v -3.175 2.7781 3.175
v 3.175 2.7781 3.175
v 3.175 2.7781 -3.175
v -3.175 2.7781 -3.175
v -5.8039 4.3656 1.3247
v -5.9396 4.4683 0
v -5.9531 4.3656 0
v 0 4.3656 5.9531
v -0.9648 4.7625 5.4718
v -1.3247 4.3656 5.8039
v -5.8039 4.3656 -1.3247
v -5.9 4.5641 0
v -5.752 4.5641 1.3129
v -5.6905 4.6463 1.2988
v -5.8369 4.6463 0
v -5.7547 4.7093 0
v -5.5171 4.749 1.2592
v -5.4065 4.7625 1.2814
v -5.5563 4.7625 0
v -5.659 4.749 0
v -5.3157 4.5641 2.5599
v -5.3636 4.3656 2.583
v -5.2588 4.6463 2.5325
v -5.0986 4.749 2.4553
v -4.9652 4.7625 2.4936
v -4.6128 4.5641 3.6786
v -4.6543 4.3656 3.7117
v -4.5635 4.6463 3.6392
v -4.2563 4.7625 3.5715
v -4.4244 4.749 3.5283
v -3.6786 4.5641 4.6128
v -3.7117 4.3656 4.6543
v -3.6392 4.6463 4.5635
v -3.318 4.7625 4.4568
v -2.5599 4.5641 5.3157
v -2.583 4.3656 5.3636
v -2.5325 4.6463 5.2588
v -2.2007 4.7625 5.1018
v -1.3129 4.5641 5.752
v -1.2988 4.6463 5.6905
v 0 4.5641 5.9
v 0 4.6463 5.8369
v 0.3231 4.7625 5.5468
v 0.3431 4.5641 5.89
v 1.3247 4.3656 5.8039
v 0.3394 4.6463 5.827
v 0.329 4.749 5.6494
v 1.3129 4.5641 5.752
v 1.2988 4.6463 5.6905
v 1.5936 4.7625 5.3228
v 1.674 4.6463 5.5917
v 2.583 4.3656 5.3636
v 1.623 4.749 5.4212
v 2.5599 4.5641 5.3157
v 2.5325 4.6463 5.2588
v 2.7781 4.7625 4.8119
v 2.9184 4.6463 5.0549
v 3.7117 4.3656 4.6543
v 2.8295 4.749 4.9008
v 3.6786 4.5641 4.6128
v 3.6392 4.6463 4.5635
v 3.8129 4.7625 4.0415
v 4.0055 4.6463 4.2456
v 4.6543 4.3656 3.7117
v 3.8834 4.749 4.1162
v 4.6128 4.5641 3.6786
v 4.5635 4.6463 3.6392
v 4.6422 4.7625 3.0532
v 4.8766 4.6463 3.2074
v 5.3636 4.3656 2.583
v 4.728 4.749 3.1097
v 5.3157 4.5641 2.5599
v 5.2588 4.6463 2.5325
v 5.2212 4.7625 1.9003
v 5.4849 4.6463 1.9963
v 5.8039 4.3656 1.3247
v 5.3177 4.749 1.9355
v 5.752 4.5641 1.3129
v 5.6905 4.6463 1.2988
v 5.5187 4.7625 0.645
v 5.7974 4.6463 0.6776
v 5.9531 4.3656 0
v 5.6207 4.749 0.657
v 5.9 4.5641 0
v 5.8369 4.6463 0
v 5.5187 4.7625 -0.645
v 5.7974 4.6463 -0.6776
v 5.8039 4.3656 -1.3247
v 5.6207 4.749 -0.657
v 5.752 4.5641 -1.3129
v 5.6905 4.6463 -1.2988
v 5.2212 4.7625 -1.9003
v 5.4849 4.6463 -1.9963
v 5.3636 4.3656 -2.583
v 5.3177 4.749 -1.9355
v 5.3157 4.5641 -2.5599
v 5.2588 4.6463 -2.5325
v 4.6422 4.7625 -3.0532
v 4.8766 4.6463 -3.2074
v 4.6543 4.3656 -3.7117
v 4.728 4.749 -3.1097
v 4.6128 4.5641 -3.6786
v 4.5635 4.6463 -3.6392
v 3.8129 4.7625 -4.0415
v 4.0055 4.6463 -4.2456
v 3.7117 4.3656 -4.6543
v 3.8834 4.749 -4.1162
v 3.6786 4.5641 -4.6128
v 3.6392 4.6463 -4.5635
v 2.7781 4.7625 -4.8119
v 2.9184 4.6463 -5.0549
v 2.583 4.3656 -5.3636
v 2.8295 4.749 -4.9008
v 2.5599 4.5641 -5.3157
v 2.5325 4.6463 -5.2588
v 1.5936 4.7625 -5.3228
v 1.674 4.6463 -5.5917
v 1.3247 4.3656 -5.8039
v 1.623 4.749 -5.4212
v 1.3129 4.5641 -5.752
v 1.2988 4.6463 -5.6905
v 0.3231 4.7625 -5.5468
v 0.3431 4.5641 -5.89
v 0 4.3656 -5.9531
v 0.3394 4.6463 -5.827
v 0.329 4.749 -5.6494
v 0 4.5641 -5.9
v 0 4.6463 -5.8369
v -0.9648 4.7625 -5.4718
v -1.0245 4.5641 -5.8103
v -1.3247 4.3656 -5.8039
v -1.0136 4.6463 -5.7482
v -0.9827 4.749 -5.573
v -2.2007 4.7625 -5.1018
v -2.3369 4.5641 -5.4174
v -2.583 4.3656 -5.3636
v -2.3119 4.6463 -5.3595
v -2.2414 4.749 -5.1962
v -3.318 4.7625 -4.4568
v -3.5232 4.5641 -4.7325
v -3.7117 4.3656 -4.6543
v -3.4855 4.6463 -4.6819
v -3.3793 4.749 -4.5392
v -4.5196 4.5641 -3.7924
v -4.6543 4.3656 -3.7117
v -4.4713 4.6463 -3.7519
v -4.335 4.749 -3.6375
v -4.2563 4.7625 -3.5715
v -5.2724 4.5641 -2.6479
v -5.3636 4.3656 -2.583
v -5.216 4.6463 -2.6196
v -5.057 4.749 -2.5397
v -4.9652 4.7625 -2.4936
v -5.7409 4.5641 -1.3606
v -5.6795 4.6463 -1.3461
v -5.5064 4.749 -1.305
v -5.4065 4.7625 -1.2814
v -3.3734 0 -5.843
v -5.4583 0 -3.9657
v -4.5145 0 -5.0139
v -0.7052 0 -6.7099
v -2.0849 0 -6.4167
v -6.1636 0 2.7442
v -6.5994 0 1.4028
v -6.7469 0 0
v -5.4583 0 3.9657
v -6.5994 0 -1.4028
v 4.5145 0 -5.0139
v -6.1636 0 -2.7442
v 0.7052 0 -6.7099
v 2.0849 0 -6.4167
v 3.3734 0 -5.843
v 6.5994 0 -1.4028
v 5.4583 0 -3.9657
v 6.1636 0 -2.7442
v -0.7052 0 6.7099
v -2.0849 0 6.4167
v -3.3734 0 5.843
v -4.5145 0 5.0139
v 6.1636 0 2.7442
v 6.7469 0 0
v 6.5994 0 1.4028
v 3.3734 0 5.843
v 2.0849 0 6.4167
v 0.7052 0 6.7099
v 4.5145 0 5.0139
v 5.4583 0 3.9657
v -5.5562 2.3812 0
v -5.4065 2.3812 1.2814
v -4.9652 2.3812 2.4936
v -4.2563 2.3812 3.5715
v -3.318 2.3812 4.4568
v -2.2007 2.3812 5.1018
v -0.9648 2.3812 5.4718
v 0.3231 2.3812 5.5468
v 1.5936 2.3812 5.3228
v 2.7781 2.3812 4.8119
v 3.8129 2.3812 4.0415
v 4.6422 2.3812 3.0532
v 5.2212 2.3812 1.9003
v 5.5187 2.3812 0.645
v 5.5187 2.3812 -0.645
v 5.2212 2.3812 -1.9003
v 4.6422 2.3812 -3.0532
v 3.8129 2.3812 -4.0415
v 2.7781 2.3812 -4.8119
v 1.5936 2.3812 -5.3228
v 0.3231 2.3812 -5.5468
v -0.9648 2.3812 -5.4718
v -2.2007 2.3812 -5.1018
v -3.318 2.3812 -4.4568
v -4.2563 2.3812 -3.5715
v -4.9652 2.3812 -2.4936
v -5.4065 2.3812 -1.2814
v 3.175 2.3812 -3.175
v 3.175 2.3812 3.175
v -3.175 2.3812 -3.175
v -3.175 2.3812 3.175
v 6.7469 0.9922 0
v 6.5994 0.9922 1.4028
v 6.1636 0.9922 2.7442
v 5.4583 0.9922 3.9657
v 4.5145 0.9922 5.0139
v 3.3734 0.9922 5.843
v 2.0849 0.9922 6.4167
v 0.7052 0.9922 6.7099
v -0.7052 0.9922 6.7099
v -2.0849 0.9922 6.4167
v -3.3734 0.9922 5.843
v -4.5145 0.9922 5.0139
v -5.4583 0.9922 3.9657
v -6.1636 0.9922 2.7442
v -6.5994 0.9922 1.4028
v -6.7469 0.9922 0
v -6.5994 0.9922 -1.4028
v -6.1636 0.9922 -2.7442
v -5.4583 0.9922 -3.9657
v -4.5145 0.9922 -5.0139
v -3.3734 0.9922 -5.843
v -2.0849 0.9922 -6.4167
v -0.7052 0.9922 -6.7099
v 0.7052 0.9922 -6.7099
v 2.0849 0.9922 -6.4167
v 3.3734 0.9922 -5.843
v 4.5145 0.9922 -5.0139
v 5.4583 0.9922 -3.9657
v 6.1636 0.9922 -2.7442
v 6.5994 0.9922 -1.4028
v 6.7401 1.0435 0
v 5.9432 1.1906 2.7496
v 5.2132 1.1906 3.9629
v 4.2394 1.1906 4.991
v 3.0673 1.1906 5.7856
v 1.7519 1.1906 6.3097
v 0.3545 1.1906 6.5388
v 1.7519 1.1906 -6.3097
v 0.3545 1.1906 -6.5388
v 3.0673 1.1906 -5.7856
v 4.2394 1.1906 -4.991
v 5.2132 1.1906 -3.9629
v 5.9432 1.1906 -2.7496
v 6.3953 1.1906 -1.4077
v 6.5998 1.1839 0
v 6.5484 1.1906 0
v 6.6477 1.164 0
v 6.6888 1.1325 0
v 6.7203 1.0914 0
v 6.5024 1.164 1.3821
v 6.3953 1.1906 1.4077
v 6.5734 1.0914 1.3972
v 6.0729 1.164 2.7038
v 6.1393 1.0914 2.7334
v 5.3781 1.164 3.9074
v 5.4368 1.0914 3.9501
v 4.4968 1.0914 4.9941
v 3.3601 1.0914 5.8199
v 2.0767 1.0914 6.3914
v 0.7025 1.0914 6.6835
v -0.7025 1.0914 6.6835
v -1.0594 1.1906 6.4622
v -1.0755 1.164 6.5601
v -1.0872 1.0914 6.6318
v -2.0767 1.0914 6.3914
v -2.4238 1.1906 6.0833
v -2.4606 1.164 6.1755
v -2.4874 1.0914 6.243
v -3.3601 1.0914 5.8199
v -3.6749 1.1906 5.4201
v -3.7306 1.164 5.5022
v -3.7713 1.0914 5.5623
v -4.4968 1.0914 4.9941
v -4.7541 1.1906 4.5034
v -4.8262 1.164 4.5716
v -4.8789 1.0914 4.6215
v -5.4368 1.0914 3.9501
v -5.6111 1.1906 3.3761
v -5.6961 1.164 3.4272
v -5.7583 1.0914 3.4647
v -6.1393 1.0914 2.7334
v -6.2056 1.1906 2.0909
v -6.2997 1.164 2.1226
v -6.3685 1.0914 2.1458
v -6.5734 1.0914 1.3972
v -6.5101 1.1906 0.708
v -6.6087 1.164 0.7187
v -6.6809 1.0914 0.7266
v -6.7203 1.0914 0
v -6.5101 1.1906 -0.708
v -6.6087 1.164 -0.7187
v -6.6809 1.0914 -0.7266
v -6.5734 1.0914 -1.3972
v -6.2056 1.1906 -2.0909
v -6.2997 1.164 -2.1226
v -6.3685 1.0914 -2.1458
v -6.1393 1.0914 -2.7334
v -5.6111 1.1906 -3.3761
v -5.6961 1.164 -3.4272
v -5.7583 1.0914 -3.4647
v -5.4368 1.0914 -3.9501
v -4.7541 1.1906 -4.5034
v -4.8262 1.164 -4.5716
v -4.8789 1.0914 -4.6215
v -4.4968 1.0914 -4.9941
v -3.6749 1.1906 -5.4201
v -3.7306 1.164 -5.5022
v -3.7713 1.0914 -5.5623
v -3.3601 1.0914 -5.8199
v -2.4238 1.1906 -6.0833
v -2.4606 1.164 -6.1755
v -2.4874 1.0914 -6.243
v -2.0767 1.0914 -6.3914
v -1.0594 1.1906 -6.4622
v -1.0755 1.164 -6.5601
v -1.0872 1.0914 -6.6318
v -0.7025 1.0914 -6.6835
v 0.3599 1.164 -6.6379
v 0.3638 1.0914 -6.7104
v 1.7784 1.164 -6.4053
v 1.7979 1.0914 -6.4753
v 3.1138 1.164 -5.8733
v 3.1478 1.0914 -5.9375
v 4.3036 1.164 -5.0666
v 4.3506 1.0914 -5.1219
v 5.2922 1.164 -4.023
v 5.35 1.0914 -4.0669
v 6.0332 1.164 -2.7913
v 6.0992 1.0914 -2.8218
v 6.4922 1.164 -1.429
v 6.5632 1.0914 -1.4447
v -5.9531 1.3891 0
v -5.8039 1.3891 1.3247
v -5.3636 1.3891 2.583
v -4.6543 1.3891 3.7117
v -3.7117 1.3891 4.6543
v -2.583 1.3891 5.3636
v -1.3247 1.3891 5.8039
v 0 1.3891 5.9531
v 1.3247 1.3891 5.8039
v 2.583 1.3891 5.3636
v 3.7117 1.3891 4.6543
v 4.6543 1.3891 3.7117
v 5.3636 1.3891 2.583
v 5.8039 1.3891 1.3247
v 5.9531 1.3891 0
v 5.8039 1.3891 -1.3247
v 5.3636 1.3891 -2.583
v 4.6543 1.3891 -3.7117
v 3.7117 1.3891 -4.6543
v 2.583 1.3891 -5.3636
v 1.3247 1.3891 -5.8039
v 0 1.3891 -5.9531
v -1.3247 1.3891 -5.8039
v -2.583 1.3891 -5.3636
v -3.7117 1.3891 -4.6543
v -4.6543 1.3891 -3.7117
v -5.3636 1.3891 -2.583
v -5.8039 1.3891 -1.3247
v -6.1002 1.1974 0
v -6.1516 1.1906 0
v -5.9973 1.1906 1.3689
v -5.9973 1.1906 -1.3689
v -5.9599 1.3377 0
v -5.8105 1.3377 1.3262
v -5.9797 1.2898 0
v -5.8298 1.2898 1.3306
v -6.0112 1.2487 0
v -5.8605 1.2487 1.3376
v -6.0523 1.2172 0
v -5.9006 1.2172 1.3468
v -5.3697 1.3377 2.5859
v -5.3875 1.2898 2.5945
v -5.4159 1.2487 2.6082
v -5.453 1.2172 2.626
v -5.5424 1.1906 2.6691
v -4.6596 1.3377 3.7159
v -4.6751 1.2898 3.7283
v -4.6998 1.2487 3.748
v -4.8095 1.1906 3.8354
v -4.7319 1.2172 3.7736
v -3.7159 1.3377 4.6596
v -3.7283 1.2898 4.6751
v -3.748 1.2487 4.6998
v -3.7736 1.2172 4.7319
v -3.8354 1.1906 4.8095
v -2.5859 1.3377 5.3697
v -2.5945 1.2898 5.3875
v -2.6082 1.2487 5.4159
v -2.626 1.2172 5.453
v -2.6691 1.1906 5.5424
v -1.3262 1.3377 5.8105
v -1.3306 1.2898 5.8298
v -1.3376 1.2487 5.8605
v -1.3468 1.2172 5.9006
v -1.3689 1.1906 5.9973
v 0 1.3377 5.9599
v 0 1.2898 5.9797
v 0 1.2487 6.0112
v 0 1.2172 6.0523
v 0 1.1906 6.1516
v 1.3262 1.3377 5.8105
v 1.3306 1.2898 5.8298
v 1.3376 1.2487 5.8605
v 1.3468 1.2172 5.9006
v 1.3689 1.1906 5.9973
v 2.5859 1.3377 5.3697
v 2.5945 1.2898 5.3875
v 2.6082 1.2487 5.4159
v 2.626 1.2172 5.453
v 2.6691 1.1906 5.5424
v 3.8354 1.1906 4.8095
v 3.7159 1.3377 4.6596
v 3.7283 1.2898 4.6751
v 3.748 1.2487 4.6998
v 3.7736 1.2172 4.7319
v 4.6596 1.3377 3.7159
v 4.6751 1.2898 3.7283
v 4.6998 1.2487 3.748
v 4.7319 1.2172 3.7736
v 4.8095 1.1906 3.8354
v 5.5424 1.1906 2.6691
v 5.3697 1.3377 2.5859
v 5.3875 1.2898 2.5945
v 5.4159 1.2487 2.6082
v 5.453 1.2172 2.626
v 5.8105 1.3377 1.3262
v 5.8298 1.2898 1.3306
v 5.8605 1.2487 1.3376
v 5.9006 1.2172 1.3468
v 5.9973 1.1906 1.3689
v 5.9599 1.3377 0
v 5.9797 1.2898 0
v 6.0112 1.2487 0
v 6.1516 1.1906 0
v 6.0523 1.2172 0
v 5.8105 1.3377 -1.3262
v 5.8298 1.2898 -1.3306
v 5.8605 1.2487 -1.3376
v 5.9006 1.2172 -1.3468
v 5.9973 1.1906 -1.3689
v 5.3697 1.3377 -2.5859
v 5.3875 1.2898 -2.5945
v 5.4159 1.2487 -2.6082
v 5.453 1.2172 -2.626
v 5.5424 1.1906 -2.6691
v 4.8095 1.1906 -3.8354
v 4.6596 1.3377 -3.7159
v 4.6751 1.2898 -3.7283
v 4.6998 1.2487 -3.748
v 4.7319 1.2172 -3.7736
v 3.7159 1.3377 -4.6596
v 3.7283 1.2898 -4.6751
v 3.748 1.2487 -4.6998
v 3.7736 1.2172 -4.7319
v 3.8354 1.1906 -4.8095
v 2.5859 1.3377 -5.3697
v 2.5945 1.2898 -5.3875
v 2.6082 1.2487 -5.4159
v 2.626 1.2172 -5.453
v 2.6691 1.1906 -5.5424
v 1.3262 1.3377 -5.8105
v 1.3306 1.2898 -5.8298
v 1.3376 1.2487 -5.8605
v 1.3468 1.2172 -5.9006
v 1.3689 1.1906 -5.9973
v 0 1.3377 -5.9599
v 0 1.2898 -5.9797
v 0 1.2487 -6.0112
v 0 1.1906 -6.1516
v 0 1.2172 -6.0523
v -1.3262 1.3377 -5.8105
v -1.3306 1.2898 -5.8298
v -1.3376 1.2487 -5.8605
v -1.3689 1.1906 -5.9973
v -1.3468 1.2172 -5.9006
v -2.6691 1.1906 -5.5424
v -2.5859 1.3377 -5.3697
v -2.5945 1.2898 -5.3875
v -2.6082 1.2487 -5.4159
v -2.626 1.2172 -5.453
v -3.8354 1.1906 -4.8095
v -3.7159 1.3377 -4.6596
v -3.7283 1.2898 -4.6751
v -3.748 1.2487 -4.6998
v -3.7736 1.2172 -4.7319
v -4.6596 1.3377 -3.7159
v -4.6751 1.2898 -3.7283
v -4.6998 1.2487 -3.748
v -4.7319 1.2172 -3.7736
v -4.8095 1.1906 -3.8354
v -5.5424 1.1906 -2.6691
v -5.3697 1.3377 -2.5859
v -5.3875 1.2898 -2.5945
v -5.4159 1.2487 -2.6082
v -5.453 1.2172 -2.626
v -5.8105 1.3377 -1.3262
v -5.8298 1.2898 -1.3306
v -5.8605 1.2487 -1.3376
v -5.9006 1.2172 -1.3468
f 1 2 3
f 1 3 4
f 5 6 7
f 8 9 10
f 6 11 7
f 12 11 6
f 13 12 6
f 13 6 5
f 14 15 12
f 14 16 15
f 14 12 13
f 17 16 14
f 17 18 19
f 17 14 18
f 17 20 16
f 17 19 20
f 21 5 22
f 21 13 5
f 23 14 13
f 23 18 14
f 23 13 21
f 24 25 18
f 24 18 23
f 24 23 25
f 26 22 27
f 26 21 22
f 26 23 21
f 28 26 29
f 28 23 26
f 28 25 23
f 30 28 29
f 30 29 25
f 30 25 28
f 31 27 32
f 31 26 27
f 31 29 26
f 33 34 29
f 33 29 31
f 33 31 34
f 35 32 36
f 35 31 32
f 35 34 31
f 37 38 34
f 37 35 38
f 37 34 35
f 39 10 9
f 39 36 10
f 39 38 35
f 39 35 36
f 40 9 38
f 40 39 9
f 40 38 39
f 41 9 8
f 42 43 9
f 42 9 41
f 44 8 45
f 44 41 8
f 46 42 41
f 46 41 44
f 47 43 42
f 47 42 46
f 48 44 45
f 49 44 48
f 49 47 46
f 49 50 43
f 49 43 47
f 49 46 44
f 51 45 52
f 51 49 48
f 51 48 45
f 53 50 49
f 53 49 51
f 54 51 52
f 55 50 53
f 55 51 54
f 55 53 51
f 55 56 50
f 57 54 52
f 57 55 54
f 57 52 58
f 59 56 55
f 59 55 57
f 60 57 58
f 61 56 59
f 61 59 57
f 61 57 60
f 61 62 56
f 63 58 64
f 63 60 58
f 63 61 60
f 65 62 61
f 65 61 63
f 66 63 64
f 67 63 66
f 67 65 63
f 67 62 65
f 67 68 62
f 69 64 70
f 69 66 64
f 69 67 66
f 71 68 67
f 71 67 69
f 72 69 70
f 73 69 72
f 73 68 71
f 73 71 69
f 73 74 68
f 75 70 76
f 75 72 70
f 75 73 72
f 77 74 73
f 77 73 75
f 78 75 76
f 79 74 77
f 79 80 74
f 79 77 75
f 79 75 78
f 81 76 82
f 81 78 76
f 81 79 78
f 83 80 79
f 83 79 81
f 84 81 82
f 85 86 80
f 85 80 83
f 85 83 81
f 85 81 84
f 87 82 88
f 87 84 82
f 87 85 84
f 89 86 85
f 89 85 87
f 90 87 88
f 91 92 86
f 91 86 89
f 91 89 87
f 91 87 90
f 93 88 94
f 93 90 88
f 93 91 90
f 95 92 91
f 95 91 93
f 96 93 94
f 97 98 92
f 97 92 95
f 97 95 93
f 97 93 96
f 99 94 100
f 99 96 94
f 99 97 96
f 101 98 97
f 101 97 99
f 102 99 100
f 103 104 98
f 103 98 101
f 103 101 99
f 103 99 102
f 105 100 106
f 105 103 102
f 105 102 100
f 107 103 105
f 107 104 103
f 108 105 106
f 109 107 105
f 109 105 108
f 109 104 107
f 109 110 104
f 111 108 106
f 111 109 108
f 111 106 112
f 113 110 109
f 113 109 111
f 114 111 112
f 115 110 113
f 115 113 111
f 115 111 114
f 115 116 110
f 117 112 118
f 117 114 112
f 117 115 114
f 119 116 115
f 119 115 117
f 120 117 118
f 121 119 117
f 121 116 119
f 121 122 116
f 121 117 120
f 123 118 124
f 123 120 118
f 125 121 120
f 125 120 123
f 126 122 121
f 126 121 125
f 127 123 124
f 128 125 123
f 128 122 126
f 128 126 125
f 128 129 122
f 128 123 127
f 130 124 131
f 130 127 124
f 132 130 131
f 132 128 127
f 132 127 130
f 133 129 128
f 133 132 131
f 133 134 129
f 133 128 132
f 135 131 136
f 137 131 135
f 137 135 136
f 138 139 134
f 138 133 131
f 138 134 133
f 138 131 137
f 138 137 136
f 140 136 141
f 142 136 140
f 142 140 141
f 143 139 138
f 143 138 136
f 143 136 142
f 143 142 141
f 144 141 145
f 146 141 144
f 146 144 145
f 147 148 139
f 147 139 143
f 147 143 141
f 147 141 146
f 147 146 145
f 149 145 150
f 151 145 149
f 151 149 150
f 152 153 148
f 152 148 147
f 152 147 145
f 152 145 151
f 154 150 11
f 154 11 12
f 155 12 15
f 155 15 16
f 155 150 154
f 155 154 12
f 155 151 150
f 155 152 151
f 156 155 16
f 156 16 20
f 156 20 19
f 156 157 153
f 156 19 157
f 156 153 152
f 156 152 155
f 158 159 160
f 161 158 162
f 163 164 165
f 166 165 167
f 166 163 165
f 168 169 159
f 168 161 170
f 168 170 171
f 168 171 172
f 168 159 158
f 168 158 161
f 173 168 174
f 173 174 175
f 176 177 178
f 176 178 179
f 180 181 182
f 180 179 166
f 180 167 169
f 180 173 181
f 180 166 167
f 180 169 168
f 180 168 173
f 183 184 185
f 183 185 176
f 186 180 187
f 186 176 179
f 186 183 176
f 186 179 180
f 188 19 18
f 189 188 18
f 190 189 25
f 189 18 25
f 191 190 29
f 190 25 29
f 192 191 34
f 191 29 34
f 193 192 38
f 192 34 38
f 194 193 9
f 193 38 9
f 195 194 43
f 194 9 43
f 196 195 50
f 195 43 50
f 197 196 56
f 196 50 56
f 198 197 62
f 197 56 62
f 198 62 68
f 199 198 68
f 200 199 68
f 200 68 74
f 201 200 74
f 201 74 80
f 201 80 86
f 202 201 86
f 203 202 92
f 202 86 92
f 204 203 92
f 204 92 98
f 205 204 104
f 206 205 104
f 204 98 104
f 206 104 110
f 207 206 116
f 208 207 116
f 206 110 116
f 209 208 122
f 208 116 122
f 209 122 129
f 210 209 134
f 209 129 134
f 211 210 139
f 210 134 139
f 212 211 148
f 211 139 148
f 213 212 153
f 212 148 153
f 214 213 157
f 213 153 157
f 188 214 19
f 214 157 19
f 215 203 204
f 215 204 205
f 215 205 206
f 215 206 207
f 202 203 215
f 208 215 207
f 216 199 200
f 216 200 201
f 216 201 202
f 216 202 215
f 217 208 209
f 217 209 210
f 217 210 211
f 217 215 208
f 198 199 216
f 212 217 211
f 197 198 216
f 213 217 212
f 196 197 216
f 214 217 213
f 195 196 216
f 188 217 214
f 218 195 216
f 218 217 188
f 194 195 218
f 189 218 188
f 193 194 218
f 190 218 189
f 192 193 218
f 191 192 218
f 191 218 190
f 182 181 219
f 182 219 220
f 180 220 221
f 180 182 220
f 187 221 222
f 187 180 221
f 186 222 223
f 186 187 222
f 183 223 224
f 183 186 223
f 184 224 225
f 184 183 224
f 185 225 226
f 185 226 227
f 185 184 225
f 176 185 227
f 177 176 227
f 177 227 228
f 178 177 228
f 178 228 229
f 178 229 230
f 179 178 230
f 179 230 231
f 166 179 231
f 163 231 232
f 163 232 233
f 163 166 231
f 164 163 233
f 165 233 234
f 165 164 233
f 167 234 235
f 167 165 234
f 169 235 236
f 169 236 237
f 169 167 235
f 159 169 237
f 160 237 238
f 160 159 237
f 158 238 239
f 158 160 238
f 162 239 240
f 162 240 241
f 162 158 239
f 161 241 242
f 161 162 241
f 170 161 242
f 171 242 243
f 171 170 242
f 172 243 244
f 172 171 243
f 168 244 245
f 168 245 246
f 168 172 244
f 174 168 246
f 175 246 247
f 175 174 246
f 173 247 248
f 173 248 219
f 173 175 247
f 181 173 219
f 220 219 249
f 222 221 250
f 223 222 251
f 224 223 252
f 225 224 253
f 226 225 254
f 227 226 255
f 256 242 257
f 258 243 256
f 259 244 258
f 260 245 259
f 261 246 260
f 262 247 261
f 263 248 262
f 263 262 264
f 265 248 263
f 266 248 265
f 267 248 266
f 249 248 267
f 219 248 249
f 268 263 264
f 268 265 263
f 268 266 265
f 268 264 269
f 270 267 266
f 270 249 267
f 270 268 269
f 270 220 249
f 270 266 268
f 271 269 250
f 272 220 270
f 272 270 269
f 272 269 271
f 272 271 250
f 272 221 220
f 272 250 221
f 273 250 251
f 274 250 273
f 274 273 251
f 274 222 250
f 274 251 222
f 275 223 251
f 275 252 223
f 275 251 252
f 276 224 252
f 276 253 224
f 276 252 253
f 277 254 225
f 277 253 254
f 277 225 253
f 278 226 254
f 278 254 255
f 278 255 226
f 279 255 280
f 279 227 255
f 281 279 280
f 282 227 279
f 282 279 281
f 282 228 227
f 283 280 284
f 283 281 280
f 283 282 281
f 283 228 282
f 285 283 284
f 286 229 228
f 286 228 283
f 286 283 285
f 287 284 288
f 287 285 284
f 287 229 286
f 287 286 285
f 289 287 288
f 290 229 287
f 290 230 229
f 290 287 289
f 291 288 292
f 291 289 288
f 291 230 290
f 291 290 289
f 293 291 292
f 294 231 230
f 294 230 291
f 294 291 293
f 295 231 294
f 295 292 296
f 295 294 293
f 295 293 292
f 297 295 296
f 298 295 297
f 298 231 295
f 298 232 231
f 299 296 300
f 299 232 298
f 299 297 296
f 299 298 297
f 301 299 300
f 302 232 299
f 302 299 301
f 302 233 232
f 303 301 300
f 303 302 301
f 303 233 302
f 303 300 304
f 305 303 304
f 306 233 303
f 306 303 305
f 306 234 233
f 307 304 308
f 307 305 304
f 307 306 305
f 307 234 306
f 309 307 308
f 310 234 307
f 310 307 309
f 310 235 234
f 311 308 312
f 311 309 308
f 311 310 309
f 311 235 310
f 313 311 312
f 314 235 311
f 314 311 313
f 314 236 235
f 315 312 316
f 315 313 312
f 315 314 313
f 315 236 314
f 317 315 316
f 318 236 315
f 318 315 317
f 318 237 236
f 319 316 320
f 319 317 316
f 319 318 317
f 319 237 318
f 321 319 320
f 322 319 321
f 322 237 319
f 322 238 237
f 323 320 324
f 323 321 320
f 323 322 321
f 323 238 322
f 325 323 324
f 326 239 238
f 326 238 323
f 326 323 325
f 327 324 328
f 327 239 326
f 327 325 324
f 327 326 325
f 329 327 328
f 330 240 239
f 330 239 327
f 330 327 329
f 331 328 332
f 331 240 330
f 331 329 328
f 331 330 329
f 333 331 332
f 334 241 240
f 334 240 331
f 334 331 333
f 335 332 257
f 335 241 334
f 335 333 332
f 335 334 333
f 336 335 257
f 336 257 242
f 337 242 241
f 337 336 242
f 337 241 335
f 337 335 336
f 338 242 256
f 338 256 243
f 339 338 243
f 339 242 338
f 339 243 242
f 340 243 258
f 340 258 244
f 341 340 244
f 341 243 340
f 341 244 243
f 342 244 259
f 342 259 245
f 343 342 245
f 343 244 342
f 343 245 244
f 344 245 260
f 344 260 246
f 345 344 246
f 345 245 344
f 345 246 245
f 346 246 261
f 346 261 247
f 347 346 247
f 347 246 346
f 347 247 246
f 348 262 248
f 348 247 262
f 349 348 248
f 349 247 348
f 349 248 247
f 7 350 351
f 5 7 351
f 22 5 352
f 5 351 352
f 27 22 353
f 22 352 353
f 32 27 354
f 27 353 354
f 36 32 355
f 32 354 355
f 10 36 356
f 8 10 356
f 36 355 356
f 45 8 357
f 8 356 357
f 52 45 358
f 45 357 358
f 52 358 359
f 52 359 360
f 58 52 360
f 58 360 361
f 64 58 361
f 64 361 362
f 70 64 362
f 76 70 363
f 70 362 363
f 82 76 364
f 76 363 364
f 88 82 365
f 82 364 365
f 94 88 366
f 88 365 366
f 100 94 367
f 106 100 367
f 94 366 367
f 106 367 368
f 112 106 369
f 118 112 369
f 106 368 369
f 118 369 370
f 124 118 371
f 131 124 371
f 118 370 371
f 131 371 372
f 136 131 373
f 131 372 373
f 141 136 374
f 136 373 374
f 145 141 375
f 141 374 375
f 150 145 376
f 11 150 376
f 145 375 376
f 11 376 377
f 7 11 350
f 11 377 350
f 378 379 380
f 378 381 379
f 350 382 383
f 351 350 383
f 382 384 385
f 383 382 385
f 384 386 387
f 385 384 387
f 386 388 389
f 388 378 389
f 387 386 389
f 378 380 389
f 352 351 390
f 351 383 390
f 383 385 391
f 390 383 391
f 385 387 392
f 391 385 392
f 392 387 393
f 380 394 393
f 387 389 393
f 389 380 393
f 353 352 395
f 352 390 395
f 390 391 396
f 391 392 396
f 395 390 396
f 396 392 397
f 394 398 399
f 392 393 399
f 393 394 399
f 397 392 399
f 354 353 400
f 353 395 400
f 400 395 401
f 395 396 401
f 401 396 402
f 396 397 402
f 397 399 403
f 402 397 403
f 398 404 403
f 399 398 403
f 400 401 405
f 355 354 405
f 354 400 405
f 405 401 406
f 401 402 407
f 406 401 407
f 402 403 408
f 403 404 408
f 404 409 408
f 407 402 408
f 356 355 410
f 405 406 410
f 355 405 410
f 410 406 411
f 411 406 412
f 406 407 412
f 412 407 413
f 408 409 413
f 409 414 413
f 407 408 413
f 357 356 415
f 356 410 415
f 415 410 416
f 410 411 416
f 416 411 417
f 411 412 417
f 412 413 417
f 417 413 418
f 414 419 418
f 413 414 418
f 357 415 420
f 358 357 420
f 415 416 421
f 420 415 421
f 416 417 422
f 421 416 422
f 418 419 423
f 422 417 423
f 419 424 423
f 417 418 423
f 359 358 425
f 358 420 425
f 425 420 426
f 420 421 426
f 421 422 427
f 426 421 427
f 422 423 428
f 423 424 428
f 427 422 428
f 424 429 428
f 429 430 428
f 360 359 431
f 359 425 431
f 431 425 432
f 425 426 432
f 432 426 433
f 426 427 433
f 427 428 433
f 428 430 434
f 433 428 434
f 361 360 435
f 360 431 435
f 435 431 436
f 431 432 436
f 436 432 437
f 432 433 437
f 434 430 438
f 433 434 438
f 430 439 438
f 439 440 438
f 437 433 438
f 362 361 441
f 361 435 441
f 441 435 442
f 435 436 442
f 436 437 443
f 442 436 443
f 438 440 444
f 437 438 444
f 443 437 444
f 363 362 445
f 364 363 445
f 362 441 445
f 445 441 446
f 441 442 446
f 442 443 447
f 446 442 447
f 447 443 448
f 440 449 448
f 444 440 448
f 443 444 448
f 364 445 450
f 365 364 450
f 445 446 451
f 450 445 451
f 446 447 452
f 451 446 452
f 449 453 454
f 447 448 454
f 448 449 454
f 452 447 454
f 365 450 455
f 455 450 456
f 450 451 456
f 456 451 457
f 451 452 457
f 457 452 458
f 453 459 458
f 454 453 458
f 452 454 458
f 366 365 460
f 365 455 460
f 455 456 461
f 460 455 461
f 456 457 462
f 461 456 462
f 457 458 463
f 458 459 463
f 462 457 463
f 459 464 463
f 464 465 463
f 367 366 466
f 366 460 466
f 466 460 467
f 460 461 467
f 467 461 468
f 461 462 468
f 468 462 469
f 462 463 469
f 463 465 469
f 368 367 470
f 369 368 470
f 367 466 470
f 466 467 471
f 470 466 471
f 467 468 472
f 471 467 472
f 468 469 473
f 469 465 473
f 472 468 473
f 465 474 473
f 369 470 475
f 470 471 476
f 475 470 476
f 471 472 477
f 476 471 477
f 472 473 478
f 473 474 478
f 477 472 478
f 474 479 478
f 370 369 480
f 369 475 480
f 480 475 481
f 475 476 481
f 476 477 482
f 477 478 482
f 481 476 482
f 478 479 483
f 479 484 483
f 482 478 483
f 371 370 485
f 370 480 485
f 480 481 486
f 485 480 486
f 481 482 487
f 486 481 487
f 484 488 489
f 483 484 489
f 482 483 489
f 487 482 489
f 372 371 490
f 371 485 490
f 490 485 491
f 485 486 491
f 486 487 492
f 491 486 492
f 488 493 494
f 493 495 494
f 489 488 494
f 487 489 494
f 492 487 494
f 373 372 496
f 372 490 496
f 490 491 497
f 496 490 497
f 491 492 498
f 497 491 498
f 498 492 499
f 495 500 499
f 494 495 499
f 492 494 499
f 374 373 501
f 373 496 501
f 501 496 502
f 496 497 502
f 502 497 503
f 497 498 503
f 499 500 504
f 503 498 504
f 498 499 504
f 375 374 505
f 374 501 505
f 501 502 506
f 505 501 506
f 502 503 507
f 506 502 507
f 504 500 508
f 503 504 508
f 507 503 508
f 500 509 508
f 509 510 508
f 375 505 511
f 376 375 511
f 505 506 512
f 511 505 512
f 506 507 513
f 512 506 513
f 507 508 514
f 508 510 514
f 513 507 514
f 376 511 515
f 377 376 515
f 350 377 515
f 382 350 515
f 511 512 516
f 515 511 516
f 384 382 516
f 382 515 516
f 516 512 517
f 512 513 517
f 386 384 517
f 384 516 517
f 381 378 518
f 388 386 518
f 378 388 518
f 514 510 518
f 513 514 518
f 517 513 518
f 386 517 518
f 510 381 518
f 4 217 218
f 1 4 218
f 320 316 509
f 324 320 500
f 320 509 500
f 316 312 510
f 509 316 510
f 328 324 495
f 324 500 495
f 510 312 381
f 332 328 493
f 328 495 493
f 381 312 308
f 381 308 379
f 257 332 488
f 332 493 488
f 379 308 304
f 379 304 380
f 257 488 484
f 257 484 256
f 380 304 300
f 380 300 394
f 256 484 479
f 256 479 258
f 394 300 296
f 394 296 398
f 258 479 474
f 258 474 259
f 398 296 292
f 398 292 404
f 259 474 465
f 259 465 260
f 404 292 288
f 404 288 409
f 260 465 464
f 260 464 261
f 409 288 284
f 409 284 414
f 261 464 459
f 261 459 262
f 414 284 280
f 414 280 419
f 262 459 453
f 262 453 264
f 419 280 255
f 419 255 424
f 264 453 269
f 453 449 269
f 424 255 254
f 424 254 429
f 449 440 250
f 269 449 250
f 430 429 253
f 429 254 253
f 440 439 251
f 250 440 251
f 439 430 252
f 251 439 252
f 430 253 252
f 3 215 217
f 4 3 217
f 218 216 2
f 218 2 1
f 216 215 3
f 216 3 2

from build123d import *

# Parameters (mm, degrees)
F0_R     = 6.746875
F1_DEPTH = 1.190625
F2_R     = 5.953125
F3_DEPTH = 3.571875
F4_R     = 0.396875
F5_R     = 0.198437
F6_R     = 5.55625
F7_DEPTH = 2.38125
F8_W     = 6.35
F8_H     = 6.35
F9_DEPTH = 0.396875


with BuildPart() as f1:
    # F0 (on Front) → F1 (new body)
    with BuildSketch(Plane.XZ):
        Circle(F0_R)
    extrude(amount=-F1_DEPTH)

    # F2 (on face) → F3 (join)
    with BuildSketch(Plane(origin=(0, 1.190625, 0), x_dir=(-1, 0, 0), z_dir=(0, 1, 0))):
        Circle(F2_R)
    extrude(amount=F3_DEPTH)

    # F4
    f4_edges = [f1.edges().sort_by_distance(p)[0] for p in [
        (5.953125, 4.7625, 0),
    ]]
    fillet(f4_edges, radius=F4_R)

    # F5
    f5_edges = [f1.edges().sort_by_distance(p)[0] for p in [
        (5.953125, 1.190625, 0),
        (-6.746875, 1.190625, 0),
    ]]
    fillet(f5_edges, radius=F5_R)

    # F6 (on face) → F7 (cut)
    with BuildSketch(Plane(origin=(0, 4.7625, 0), x_dir=(-1, 0, 0), z_dir=(0, 1, 0))):
        Circle(F6_R)
    extrude(amount=-F7_DEPTH, mode=Mode.SUBTRACT)

    # F8 (on face) → F9 (join)
    with BuildSketch(Plane(origin=(0, 2.38125, 0), x_dir=(-1, 0, 0), z_dir=(0, 1, 0))):
        Rectangle(F8_W, F8_H)
    extrude(amount=F9_DEPTH)


solid = f1.part
